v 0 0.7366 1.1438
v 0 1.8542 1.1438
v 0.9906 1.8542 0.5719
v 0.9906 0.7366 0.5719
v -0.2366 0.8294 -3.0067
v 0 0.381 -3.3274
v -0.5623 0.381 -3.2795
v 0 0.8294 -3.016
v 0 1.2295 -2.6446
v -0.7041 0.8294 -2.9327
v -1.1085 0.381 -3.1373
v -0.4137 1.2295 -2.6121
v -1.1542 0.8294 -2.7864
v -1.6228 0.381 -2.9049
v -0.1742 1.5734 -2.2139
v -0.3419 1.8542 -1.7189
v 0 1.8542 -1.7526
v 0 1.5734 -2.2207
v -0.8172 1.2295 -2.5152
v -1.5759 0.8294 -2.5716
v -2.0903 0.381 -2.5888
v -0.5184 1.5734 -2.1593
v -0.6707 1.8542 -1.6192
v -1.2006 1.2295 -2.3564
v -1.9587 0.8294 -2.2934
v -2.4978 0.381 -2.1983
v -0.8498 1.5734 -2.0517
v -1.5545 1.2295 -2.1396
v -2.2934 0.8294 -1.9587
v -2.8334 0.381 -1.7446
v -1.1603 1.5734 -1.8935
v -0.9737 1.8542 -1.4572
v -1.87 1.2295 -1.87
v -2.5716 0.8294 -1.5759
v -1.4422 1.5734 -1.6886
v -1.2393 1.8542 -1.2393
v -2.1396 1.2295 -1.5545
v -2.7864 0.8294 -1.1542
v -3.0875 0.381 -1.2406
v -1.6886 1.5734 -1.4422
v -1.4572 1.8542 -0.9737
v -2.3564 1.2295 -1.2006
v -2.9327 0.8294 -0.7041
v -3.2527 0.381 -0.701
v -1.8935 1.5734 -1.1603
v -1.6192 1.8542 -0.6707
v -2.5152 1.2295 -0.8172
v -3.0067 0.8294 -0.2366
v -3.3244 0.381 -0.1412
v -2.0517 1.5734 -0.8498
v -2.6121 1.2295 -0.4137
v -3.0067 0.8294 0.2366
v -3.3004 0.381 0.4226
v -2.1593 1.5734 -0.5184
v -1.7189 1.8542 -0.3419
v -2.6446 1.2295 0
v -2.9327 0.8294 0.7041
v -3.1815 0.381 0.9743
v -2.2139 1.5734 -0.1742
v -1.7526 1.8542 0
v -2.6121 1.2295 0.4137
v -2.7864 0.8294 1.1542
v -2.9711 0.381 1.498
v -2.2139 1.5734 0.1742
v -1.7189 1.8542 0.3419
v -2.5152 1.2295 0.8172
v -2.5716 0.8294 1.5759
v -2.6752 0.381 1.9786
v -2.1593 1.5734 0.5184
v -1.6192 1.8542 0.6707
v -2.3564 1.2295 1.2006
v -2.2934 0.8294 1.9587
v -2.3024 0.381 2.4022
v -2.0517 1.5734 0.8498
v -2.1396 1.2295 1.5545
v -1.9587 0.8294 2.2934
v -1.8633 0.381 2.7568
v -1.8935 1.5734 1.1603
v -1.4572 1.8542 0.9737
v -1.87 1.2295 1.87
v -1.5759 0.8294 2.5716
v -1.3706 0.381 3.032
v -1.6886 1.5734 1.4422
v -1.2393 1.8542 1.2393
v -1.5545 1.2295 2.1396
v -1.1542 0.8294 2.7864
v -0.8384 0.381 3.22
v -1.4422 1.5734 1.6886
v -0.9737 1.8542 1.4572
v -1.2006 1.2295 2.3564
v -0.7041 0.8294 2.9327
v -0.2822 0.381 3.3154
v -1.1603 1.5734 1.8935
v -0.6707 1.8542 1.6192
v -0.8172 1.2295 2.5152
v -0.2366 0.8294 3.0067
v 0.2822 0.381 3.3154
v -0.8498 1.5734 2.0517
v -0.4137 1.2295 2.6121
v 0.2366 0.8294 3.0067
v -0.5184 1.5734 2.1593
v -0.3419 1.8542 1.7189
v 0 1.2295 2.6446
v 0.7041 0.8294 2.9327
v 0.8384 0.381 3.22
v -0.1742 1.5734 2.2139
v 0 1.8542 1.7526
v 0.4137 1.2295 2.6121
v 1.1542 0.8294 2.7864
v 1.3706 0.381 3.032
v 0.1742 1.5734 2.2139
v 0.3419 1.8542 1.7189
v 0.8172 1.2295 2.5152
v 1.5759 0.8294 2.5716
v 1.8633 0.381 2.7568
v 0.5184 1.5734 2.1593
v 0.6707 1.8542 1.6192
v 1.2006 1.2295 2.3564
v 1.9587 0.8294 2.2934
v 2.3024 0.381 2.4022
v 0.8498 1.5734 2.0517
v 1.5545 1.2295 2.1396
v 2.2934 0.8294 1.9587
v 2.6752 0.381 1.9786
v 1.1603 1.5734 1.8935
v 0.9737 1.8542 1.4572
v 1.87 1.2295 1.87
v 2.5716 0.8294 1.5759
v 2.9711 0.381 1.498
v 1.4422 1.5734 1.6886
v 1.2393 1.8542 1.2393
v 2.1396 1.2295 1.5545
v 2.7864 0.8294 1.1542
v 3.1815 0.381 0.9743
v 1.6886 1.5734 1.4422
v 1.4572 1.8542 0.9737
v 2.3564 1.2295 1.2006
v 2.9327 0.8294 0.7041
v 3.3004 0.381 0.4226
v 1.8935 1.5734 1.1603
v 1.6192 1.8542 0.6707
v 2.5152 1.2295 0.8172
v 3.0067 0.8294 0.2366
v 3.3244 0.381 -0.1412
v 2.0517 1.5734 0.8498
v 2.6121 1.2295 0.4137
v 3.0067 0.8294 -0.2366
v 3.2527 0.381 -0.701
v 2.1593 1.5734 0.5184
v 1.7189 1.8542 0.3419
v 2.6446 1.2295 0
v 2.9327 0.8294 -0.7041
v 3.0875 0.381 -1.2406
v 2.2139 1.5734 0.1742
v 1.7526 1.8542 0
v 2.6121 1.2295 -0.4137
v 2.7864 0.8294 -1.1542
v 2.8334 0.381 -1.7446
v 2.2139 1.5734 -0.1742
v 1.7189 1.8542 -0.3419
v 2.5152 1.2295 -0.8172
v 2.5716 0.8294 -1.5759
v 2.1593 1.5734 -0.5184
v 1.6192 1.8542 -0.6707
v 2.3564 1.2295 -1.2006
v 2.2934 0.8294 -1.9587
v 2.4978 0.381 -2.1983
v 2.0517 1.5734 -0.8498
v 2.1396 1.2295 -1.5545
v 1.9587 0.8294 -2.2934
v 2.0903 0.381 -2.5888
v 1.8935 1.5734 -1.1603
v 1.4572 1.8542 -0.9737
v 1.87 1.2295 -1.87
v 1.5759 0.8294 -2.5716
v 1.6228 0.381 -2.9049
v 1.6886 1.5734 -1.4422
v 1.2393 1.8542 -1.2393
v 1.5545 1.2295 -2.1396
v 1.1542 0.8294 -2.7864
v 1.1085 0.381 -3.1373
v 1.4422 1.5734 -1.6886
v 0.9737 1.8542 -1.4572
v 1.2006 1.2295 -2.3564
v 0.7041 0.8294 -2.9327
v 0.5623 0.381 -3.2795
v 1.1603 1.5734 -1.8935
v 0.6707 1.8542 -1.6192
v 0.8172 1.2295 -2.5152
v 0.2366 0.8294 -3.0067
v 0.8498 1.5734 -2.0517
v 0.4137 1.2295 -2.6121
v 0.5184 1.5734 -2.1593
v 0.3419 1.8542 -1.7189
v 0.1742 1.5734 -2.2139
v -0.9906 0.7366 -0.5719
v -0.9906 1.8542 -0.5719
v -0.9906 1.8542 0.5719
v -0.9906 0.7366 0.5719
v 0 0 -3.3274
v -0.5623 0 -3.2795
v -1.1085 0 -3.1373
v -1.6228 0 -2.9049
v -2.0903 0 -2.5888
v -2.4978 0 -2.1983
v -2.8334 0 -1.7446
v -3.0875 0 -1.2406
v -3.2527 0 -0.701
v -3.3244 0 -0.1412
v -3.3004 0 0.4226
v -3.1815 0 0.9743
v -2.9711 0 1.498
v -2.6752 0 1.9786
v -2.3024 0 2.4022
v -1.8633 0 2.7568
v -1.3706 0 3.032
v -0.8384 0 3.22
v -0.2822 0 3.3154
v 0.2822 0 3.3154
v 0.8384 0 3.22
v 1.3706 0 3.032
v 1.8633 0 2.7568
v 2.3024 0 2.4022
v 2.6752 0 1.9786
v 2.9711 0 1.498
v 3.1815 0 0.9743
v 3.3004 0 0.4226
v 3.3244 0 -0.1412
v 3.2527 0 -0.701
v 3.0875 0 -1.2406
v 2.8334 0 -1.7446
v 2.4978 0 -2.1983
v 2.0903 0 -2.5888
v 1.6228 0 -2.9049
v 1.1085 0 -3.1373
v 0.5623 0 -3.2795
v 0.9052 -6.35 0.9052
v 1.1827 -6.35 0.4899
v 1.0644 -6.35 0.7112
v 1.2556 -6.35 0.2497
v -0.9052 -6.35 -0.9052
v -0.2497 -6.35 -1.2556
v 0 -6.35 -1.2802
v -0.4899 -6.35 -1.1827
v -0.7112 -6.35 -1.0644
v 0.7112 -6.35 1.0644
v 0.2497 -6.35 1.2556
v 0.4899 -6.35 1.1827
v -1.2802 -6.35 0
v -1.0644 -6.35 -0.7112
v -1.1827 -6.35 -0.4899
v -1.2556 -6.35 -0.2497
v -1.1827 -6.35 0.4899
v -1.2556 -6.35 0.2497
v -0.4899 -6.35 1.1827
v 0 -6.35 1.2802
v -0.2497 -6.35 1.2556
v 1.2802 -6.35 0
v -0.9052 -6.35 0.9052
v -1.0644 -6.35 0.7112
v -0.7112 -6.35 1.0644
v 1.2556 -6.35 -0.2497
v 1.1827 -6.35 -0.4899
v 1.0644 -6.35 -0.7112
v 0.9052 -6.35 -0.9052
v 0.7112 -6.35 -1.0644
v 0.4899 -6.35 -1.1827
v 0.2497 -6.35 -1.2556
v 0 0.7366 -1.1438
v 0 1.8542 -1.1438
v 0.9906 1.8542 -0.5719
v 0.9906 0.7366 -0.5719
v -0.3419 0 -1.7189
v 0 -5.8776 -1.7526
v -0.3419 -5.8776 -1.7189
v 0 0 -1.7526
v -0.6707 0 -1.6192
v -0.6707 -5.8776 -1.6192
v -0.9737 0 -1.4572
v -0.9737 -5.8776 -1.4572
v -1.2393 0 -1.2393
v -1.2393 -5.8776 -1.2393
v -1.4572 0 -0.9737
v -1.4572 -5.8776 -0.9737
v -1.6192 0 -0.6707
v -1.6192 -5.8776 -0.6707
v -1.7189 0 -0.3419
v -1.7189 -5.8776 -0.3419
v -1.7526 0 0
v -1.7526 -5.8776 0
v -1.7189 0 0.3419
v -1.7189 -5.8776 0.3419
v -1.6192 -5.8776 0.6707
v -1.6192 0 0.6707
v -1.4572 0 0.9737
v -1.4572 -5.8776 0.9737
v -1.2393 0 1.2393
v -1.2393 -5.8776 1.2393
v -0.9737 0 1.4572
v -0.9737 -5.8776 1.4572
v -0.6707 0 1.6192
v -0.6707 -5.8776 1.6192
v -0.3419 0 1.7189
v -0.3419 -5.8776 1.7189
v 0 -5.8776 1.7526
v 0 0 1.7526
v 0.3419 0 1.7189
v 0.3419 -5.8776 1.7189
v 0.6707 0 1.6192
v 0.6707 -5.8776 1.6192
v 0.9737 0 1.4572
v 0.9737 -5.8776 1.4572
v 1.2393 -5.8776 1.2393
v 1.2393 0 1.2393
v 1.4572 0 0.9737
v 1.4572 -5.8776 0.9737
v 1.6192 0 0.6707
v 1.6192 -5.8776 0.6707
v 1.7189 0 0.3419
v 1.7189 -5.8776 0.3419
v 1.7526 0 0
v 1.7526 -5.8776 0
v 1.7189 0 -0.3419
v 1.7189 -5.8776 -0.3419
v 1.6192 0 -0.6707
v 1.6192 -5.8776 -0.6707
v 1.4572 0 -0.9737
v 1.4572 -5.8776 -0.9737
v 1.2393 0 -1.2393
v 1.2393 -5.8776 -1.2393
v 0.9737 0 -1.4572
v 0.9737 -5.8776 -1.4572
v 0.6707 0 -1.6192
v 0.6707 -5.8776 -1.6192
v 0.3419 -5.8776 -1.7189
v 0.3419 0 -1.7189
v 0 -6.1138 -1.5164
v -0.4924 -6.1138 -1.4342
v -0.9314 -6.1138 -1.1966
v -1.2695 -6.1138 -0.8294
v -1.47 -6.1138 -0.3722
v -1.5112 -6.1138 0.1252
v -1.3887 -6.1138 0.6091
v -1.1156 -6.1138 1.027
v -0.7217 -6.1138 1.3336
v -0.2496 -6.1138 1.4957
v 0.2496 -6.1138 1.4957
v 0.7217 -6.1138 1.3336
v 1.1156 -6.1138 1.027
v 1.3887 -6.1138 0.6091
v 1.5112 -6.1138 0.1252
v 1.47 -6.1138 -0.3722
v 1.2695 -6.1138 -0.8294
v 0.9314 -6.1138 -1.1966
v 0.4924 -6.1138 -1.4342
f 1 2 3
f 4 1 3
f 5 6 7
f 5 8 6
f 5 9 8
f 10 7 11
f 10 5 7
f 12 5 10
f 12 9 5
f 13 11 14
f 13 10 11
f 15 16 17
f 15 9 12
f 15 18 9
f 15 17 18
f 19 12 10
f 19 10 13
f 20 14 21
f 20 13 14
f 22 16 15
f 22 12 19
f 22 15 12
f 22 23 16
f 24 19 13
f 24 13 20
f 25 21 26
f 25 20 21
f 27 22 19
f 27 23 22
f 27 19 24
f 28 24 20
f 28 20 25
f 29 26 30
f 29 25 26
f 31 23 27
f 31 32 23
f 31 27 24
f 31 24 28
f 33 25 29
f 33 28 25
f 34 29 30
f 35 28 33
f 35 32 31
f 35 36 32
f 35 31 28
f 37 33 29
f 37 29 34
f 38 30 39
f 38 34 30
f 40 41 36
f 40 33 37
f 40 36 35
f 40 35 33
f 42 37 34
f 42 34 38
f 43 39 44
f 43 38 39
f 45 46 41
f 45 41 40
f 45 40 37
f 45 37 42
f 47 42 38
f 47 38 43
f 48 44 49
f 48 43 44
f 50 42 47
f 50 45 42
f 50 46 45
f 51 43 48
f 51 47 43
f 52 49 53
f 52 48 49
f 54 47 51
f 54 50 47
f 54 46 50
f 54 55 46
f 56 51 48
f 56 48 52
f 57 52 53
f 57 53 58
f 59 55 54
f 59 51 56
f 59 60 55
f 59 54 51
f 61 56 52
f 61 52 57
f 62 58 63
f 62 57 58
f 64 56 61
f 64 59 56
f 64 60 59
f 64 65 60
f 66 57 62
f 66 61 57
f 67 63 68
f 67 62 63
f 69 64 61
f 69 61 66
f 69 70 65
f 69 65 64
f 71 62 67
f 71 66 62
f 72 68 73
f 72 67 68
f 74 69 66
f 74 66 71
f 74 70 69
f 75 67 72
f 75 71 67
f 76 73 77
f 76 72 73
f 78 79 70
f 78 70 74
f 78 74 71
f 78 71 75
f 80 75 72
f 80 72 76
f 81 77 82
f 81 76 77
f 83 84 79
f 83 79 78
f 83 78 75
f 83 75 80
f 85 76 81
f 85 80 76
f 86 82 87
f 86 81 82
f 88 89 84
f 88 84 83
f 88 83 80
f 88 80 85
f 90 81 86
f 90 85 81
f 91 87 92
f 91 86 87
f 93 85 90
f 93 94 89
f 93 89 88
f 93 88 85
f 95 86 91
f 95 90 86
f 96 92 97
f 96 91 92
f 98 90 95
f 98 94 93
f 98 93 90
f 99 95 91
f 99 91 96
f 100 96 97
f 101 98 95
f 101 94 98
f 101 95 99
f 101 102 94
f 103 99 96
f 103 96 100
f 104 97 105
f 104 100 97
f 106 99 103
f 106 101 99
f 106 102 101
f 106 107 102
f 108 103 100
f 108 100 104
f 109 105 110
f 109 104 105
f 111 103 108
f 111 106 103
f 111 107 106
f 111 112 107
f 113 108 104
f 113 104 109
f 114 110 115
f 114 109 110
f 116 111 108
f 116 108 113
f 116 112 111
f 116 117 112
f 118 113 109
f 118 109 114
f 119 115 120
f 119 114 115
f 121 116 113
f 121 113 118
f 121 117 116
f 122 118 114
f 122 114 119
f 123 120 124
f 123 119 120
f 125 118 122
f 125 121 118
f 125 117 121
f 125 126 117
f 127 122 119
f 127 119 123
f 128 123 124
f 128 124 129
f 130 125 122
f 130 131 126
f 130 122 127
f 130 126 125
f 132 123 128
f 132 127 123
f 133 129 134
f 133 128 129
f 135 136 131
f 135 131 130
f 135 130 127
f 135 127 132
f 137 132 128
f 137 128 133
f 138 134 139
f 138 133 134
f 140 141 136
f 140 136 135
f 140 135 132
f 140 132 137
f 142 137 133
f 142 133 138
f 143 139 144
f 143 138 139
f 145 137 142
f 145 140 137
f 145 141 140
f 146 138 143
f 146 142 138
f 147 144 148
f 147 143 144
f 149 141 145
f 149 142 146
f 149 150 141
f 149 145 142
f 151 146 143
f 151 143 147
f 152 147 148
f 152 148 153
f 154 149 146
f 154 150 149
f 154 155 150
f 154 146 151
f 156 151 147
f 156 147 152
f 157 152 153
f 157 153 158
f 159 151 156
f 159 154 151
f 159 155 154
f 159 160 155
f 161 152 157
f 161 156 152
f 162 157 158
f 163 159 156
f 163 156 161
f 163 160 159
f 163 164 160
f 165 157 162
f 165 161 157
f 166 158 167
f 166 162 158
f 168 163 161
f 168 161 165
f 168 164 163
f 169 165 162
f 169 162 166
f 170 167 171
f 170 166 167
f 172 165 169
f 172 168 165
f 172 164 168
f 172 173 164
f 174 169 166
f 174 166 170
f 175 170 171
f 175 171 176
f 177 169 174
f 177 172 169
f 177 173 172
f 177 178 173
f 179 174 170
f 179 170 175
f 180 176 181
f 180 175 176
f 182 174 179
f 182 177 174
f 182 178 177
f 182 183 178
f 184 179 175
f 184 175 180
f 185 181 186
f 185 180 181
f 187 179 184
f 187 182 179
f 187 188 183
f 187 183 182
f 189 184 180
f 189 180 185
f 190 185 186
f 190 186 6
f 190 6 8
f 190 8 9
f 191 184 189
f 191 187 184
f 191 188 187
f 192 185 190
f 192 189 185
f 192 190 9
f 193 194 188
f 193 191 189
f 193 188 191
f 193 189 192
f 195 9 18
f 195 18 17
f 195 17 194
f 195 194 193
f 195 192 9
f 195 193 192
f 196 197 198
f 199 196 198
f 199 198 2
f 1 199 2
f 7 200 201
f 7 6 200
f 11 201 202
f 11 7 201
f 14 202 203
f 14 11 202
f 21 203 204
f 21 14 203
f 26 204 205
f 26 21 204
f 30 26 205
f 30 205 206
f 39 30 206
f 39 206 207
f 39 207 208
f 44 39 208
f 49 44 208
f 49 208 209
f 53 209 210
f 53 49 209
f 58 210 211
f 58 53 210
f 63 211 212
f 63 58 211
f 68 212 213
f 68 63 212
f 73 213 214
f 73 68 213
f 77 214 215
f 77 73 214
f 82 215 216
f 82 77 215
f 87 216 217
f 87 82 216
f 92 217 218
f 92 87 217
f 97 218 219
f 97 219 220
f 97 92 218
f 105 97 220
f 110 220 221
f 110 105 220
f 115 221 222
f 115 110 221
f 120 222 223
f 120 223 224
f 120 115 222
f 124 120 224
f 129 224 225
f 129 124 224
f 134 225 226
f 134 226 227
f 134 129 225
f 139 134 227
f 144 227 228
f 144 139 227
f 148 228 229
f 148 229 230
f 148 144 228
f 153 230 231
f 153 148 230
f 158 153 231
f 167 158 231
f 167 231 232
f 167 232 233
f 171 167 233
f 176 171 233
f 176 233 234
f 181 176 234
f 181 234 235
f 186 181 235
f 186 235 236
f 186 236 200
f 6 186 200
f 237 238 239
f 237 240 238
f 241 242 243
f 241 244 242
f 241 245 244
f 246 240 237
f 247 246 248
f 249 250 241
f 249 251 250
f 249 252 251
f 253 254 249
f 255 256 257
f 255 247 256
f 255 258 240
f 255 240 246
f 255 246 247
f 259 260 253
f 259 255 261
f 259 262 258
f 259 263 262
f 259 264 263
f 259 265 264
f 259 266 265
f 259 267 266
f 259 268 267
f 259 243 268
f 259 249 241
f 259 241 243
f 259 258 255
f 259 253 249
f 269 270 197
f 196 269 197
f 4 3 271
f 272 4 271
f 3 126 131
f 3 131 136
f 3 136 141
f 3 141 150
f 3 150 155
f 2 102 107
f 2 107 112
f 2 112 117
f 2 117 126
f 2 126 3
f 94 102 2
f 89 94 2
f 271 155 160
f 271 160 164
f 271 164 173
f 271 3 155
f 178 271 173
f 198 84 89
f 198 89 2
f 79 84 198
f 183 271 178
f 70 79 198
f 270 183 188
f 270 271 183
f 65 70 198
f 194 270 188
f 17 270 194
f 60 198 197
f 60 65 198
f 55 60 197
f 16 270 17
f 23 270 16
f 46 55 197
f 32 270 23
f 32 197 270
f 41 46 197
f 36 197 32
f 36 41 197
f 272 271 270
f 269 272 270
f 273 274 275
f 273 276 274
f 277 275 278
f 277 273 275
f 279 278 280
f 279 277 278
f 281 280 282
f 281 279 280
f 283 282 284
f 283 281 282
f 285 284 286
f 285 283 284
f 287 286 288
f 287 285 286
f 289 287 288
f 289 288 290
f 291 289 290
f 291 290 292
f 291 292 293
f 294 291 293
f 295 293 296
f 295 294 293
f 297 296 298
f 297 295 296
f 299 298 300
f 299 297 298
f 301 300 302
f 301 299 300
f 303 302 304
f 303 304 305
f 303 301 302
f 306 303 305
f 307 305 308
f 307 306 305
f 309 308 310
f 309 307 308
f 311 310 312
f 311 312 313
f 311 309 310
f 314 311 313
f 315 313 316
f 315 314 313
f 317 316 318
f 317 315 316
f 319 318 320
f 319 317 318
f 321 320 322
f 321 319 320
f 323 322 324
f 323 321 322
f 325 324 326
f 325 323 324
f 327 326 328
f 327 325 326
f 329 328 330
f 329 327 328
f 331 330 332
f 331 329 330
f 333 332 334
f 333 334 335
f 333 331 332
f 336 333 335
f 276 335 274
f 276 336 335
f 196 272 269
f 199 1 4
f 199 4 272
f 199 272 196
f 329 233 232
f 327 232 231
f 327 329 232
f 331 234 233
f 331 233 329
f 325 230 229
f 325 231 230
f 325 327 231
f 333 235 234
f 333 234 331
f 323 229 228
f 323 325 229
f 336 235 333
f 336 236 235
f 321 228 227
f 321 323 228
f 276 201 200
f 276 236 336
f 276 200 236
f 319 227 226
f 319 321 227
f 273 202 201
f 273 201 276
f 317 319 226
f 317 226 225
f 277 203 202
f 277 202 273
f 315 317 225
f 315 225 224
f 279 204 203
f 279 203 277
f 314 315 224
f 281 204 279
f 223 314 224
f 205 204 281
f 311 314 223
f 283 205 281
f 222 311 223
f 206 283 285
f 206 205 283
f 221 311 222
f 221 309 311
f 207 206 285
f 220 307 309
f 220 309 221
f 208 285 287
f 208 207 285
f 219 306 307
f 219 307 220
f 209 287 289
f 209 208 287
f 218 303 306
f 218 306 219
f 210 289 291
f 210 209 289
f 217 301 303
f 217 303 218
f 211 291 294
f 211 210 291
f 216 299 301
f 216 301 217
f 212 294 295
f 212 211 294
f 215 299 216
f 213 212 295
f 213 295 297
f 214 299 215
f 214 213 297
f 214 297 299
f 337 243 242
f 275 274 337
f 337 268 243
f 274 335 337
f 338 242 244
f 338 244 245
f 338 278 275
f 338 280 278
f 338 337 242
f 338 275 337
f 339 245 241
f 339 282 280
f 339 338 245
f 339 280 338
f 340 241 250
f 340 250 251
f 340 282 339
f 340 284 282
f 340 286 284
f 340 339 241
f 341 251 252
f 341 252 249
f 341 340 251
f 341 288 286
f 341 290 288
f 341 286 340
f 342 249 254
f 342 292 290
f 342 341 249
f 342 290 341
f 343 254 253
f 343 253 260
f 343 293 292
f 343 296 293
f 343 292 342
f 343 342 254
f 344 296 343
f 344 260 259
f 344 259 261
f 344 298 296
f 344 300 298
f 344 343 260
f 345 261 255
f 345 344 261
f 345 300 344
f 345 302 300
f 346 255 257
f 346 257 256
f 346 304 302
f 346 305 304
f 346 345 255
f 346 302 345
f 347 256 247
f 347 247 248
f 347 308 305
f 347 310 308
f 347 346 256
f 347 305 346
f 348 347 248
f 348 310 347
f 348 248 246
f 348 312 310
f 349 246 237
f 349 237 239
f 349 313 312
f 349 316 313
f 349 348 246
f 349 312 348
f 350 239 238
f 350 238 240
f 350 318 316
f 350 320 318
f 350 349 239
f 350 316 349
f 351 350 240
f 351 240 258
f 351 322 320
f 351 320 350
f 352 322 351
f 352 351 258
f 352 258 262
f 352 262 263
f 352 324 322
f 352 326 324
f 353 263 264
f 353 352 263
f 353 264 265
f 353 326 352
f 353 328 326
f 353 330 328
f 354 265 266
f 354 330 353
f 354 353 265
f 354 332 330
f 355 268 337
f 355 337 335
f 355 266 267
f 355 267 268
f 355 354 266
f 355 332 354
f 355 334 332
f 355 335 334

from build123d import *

# Parameters (mm, degrees)
CUT_EXTRUDE1_DEPTH = 1.117599032


with BuildPart() as part:
    # Sketch1 → Base-Revolve (revolve)
    with BuildSketch(Plane.XY, mode=Mode.PRIVATE) as base_revolve_sk:
        with BuildLine():
            Line((0, 0), (3.327397118, 0))
            Line((3.327397118, 0), (3.327397118, 0.38099967))
            ThreePointArc((3.327397118, 0.38099967), (2.644648832, 1.229467376), (1.752598482, 1.854198394))
            Line((1.752598482, 1.854198394), (0, 1.854198394))
            Line((0, 1.854198394), (0, 0))
        make_face()
    revolve(base_revolve_sk.sketch.rotate(Axis((0, 0, 0), (0, 1, 0)), 90), axis=Axis((0, 0, 0), (0, 1, 0)))

    # Sketch2 → Boss-Revolve1 (revolve)
    with BuildSketch(Plane.XY, mode=Mode.PRIVATE) as boss_revolve1_sk:
        Polygon((0, -6.3499945), (1.280158891, -6.3499945), (1.752598482, -5.877554909), (1.752598482, 0), (0, 0), align=None)
    revolve(boss_revolve1_sk.sketch.rotate(Axis((0, 0, 0), (0, 1, 0)), 90), axis=Axis((0, 0, 0), (0, 1, 0)))

    # Sketch3 → Cut-Extrude1 (cut)
    with BuildSketch(Plane(origin=(0, 1.854198394, 0), x_dir=(-1, 0, 0), z_dir=(0, 1, 0))):
        Polygon((0.990599142, 0.571922681), (0, 1.143845363), (-0.990599142, 0.571922681), (-0.990599142, -0.571922681), (0, -1.143845363), (0.990599142, -0.571922681), align=None)
    extrude(amount=-CUT_EXTRUDE1_DEPTH, mode=Mode.SUBTRACT)


solid = part.part
